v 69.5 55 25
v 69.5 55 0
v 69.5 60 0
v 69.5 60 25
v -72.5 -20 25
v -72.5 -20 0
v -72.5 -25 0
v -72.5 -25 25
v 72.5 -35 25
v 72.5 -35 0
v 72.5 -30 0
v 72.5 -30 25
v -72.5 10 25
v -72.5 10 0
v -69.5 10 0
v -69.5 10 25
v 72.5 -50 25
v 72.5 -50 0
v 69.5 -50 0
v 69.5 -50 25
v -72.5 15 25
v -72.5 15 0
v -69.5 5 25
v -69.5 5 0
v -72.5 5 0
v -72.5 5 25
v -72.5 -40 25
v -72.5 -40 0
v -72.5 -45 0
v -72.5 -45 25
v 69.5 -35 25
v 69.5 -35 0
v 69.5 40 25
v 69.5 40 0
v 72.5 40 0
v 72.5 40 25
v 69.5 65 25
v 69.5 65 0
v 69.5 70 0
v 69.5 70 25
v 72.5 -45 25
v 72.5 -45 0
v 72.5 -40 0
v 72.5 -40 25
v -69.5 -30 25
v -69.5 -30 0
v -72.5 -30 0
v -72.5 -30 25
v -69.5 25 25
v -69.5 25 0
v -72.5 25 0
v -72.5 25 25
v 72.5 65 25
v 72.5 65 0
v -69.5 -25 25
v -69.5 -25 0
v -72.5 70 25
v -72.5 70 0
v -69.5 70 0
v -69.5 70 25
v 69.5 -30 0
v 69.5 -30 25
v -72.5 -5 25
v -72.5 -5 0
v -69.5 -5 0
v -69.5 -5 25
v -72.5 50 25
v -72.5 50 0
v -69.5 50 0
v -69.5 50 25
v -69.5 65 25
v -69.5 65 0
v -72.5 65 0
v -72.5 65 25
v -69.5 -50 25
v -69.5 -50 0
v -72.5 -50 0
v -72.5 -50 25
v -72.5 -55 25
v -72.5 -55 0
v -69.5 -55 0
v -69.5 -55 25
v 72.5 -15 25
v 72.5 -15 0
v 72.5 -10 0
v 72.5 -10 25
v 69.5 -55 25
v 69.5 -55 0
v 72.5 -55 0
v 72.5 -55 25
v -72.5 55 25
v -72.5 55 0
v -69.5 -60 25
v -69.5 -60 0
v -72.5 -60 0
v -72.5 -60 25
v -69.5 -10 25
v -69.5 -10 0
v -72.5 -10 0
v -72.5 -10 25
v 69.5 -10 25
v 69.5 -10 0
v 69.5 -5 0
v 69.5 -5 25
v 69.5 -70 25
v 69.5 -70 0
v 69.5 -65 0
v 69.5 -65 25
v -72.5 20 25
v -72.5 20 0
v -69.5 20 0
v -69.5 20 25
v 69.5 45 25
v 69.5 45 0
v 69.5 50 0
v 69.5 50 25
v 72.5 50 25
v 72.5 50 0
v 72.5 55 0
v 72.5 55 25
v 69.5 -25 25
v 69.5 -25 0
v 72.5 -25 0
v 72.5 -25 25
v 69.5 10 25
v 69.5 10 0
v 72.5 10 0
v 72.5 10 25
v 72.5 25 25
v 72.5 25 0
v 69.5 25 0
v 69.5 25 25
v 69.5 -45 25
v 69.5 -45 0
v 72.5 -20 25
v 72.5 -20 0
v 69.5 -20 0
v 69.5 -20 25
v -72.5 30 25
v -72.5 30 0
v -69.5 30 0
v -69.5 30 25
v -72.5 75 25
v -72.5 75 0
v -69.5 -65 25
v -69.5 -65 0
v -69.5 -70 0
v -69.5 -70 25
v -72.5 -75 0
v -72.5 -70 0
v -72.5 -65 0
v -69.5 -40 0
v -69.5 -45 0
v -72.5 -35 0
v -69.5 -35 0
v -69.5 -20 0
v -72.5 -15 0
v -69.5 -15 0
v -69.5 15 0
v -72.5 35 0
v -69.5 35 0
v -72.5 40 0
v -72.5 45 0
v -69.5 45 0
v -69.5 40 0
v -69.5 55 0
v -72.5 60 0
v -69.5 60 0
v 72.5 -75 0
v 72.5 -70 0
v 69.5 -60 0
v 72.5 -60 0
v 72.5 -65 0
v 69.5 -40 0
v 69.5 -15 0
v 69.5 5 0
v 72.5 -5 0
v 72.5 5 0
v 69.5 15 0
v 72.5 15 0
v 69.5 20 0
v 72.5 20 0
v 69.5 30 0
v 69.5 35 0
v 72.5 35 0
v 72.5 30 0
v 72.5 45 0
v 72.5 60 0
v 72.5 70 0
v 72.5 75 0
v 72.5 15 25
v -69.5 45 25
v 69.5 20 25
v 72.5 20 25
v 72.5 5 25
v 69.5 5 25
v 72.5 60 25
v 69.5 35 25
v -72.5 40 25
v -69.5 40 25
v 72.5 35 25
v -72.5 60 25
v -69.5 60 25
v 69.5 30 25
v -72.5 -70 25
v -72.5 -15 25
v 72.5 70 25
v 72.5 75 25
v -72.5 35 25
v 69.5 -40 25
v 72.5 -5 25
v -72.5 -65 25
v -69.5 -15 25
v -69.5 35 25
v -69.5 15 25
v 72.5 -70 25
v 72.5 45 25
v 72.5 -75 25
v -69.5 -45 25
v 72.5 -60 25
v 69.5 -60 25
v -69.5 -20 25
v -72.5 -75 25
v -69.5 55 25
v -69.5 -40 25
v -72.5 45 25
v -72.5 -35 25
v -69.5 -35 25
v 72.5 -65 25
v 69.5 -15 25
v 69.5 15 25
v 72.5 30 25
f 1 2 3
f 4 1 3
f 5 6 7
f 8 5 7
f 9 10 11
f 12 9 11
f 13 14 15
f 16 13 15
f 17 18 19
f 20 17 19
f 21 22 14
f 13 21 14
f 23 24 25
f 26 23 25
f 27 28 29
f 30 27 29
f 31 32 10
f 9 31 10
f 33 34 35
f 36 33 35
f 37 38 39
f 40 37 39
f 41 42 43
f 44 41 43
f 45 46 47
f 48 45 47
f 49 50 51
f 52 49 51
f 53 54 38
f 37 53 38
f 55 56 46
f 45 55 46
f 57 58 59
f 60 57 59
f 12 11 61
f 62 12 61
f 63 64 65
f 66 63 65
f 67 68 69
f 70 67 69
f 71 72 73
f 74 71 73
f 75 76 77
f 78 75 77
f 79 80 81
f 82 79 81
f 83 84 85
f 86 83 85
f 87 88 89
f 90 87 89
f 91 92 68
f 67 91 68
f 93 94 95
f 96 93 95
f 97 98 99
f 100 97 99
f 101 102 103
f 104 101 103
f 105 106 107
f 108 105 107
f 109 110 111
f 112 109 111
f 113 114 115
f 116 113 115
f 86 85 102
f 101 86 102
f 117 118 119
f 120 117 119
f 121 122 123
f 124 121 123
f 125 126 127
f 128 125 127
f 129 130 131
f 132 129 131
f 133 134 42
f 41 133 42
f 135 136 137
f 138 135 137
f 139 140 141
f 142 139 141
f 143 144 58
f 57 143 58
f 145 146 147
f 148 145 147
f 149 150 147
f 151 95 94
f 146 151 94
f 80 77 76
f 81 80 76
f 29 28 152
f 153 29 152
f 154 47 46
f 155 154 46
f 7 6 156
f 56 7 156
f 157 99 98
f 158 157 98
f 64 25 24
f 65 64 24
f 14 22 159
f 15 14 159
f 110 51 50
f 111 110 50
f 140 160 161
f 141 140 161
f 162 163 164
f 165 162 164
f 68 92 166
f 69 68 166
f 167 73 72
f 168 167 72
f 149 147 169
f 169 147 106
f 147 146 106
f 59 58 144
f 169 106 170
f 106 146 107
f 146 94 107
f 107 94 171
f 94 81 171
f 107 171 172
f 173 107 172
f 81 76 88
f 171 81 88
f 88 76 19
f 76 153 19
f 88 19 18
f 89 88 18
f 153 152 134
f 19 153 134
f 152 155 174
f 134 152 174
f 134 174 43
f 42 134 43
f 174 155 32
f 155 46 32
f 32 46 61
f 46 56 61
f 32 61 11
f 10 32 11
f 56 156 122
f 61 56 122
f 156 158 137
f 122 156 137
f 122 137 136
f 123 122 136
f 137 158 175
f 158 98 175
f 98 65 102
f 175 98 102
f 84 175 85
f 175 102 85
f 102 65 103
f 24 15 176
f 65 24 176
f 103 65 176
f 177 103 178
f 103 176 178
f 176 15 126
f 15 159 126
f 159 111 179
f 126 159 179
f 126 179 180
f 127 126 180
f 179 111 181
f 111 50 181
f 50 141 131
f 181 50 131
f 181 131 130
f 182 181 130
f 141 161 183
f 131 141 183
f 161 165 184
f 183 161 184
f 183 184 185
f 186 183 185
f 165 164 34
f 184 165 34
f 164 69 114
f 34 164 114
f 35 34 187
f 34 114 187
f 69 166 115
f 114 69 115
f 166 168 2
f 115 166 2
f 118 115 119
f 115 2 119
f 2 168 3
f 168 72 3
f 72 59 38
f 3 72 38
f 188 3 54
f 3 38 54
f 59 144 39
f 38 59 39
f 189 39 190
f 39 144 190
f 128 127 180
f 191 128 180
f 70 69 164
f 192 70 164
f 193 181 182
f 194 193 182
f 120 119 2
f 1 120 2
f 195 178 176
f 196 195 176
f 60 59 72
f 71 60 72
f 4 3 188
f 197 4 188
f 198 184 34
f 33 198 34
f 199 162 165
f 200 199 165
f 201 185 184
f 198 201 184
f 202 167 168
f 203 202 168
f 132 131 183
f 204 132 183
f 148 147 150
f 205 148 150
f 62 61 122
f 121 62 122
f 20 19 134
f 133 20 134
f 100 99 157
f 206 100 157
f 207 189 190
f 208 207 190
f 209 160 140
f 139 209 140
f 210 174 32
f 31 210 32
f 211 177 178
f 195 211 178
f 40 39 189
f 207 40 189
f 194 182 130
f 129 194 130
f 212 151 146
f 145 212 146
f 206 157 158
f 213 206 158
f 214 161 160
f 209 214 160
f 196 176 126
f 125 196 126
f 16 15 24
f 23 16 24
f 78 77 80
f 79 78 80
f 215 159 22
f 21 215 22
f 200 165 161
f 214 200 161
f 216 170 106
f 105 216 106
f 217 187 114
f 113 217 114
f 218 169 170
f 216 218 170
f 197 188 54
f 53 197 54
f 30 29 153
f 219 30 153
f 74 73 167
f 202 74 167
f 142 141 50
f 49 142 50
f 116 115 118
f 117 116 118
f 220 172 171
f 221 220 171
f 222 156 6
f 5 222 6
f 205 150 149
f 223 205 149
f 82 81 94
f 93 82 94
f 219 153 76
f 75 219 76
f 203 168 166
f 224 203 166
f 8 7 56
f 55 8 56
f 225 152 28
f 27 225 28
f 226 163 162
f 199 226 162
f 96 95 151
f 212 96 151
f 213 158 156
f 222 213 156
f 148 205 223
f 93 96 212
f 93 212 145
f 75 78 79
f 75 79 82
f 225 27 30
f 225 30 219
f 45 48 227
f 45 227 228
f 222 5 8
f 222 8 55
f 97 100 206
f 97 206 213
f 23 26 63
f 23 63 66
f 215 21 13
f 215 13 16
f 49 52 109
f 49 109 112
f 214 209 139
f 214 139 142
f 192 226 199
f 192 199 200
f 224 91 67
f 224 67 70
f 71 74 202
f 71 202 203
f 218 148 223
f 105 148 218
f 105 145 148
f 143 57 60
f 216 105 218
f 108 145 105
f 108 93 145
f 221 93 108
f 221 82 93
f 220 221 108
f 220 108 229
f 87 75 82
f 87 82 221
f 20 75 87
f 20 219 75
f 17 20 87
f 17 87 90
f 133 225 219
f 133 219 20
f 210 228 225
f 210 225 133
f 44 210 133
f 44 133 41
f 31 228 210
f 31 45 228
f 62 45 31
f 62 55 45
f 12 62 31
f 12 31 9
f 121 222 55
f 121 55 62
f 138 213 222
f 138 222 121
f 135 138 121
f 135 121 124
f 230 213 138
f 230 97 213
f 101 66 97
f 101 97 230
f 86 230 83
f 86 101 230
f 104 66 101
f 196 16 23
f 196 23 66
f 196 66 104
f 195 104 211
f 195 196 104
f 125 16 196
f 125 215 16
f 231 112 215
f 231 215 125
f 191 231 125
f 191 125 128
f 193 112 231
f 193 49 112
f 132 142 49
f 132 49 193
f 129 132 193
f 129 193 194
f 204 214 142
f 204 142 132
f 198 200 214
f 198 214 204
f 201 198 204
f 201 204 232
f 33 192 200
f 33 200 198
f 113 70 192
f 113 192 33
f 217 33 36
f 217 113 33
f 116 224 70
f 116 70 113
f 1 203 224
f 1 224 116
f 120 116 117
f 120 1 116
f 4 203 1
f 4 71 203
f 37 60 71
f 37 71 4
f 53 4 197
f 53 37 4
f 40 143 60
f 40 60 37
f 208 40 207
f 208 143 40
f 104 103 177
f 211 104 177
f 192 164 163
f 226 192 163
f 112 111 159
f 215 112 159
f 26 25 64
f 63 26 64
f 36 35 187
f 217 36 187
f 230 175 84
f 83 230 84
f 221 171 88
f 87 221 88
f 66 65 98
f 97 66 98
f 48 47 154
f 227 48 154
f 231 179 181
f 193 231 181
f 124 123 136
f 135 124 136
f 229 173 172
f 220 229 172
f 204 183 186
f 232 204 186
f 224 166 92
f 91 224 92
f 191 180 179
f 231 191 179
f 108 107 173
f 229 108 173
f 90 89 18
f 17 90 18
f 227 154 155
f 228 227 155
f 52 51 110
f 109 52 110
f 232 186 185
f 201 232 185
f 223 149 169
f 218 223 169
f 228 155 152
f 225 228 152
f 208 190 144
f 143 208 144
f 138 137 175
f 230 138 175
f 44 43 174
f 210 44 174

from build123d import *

# Parameters (mm, degrees)
F1_DEPTH = 25


with BuildPart() as f1:
    # F0 (on Top) → F1 (new body)
    with BuildSketch(Plane.XY):
        Polygon((72.5, 70), (72.5, 75), (-72.5, 75), (-72.5, 70), (-69.5, 70), (-69.5, 65), (-72.5, 65), (-72.5, 60), (-69.5, 60), (-69.5, 55), (-72.5, 55), (-72.5, 50), (-69.5, 50), (-69.5, 45), (-72.5, 45), (-72.5, 40), (-69.5, 40), (-69.5, 35), (-72.5, 35), (-72.5, 30), (-69.5, 30), (-69.5, 25), (-72.5, 25), (-72.5, 20), (-69.5, 20), (-69.5, 15), (-72.5, 15), (-72.5, 10), (-69.5, 10), (-69.5, 5), (-72.5, 5), (-72.5, 0), (-72.5, -5), (-69.5, -5), (-69.5, -10), (-72.5, -10), (-72.5, -15), (-69.5, -15), (-69.5, -20), (-72.5, -20), (-72.5, -25), (-69.5, -25), (-69.5, -30), (-72.5, -30), (-72.5, -35), (-69.5, -35), (-69.5, -40), (-72.5, -40), (-72.5, -45), (-69.5, -45), (-69.5, -50), (-72.5, -50), (-72.5, -55), (-69.5, -55), (-69.5, -60), (-72.5, -60), (-72.5, -65), (-69.5, -65), (-69.5, -70), (-72.5, -70), (-72.5, -75), (72.5, -75), (72.5, -70), (69.5, -70), (69.5, -65), (72.5, -65), (72.5, -60), (69.5, -60), (69.5, -55), (72.5, -55), (72.5, -50), (69.5, -50), (69.5, -45), (72.5, -45), (72.5, -40), (69.5, -40), (69.5, -35), (72.5, -35), (72.5, -30), (69.5, -30), (69.5, -25), (72.5, -25), (72.5, -20), (69.5, -20), (69.5, -15), (72.5, -15), (72.5, -10), (69.5, -10), (69.5, -5), (72.5, -5), (72.5, 0), (72.5, 5), (69.5, 5), (69.5, 10), (72.5, 10), (72.5, 15), (69.5, 15), (69.5, 20), (72.5, 20), (72.5, 25), (69.5, 25), (69.5, 30), (72.5, 30), (72.5, 35), (69.5, 35), (69.5, 40), (72.5, 40), (72.5, 45), (69.5, 45), (69.5, 50), (72.5, 50), (72.5, 55), (69.5, 55), (69.5, 60), (72.5, 60), (72.5, 65), (69.5, 65), (69.5, 70), align=None)
    extrude(amount=F1_DEPTH)


solid = f1.part
